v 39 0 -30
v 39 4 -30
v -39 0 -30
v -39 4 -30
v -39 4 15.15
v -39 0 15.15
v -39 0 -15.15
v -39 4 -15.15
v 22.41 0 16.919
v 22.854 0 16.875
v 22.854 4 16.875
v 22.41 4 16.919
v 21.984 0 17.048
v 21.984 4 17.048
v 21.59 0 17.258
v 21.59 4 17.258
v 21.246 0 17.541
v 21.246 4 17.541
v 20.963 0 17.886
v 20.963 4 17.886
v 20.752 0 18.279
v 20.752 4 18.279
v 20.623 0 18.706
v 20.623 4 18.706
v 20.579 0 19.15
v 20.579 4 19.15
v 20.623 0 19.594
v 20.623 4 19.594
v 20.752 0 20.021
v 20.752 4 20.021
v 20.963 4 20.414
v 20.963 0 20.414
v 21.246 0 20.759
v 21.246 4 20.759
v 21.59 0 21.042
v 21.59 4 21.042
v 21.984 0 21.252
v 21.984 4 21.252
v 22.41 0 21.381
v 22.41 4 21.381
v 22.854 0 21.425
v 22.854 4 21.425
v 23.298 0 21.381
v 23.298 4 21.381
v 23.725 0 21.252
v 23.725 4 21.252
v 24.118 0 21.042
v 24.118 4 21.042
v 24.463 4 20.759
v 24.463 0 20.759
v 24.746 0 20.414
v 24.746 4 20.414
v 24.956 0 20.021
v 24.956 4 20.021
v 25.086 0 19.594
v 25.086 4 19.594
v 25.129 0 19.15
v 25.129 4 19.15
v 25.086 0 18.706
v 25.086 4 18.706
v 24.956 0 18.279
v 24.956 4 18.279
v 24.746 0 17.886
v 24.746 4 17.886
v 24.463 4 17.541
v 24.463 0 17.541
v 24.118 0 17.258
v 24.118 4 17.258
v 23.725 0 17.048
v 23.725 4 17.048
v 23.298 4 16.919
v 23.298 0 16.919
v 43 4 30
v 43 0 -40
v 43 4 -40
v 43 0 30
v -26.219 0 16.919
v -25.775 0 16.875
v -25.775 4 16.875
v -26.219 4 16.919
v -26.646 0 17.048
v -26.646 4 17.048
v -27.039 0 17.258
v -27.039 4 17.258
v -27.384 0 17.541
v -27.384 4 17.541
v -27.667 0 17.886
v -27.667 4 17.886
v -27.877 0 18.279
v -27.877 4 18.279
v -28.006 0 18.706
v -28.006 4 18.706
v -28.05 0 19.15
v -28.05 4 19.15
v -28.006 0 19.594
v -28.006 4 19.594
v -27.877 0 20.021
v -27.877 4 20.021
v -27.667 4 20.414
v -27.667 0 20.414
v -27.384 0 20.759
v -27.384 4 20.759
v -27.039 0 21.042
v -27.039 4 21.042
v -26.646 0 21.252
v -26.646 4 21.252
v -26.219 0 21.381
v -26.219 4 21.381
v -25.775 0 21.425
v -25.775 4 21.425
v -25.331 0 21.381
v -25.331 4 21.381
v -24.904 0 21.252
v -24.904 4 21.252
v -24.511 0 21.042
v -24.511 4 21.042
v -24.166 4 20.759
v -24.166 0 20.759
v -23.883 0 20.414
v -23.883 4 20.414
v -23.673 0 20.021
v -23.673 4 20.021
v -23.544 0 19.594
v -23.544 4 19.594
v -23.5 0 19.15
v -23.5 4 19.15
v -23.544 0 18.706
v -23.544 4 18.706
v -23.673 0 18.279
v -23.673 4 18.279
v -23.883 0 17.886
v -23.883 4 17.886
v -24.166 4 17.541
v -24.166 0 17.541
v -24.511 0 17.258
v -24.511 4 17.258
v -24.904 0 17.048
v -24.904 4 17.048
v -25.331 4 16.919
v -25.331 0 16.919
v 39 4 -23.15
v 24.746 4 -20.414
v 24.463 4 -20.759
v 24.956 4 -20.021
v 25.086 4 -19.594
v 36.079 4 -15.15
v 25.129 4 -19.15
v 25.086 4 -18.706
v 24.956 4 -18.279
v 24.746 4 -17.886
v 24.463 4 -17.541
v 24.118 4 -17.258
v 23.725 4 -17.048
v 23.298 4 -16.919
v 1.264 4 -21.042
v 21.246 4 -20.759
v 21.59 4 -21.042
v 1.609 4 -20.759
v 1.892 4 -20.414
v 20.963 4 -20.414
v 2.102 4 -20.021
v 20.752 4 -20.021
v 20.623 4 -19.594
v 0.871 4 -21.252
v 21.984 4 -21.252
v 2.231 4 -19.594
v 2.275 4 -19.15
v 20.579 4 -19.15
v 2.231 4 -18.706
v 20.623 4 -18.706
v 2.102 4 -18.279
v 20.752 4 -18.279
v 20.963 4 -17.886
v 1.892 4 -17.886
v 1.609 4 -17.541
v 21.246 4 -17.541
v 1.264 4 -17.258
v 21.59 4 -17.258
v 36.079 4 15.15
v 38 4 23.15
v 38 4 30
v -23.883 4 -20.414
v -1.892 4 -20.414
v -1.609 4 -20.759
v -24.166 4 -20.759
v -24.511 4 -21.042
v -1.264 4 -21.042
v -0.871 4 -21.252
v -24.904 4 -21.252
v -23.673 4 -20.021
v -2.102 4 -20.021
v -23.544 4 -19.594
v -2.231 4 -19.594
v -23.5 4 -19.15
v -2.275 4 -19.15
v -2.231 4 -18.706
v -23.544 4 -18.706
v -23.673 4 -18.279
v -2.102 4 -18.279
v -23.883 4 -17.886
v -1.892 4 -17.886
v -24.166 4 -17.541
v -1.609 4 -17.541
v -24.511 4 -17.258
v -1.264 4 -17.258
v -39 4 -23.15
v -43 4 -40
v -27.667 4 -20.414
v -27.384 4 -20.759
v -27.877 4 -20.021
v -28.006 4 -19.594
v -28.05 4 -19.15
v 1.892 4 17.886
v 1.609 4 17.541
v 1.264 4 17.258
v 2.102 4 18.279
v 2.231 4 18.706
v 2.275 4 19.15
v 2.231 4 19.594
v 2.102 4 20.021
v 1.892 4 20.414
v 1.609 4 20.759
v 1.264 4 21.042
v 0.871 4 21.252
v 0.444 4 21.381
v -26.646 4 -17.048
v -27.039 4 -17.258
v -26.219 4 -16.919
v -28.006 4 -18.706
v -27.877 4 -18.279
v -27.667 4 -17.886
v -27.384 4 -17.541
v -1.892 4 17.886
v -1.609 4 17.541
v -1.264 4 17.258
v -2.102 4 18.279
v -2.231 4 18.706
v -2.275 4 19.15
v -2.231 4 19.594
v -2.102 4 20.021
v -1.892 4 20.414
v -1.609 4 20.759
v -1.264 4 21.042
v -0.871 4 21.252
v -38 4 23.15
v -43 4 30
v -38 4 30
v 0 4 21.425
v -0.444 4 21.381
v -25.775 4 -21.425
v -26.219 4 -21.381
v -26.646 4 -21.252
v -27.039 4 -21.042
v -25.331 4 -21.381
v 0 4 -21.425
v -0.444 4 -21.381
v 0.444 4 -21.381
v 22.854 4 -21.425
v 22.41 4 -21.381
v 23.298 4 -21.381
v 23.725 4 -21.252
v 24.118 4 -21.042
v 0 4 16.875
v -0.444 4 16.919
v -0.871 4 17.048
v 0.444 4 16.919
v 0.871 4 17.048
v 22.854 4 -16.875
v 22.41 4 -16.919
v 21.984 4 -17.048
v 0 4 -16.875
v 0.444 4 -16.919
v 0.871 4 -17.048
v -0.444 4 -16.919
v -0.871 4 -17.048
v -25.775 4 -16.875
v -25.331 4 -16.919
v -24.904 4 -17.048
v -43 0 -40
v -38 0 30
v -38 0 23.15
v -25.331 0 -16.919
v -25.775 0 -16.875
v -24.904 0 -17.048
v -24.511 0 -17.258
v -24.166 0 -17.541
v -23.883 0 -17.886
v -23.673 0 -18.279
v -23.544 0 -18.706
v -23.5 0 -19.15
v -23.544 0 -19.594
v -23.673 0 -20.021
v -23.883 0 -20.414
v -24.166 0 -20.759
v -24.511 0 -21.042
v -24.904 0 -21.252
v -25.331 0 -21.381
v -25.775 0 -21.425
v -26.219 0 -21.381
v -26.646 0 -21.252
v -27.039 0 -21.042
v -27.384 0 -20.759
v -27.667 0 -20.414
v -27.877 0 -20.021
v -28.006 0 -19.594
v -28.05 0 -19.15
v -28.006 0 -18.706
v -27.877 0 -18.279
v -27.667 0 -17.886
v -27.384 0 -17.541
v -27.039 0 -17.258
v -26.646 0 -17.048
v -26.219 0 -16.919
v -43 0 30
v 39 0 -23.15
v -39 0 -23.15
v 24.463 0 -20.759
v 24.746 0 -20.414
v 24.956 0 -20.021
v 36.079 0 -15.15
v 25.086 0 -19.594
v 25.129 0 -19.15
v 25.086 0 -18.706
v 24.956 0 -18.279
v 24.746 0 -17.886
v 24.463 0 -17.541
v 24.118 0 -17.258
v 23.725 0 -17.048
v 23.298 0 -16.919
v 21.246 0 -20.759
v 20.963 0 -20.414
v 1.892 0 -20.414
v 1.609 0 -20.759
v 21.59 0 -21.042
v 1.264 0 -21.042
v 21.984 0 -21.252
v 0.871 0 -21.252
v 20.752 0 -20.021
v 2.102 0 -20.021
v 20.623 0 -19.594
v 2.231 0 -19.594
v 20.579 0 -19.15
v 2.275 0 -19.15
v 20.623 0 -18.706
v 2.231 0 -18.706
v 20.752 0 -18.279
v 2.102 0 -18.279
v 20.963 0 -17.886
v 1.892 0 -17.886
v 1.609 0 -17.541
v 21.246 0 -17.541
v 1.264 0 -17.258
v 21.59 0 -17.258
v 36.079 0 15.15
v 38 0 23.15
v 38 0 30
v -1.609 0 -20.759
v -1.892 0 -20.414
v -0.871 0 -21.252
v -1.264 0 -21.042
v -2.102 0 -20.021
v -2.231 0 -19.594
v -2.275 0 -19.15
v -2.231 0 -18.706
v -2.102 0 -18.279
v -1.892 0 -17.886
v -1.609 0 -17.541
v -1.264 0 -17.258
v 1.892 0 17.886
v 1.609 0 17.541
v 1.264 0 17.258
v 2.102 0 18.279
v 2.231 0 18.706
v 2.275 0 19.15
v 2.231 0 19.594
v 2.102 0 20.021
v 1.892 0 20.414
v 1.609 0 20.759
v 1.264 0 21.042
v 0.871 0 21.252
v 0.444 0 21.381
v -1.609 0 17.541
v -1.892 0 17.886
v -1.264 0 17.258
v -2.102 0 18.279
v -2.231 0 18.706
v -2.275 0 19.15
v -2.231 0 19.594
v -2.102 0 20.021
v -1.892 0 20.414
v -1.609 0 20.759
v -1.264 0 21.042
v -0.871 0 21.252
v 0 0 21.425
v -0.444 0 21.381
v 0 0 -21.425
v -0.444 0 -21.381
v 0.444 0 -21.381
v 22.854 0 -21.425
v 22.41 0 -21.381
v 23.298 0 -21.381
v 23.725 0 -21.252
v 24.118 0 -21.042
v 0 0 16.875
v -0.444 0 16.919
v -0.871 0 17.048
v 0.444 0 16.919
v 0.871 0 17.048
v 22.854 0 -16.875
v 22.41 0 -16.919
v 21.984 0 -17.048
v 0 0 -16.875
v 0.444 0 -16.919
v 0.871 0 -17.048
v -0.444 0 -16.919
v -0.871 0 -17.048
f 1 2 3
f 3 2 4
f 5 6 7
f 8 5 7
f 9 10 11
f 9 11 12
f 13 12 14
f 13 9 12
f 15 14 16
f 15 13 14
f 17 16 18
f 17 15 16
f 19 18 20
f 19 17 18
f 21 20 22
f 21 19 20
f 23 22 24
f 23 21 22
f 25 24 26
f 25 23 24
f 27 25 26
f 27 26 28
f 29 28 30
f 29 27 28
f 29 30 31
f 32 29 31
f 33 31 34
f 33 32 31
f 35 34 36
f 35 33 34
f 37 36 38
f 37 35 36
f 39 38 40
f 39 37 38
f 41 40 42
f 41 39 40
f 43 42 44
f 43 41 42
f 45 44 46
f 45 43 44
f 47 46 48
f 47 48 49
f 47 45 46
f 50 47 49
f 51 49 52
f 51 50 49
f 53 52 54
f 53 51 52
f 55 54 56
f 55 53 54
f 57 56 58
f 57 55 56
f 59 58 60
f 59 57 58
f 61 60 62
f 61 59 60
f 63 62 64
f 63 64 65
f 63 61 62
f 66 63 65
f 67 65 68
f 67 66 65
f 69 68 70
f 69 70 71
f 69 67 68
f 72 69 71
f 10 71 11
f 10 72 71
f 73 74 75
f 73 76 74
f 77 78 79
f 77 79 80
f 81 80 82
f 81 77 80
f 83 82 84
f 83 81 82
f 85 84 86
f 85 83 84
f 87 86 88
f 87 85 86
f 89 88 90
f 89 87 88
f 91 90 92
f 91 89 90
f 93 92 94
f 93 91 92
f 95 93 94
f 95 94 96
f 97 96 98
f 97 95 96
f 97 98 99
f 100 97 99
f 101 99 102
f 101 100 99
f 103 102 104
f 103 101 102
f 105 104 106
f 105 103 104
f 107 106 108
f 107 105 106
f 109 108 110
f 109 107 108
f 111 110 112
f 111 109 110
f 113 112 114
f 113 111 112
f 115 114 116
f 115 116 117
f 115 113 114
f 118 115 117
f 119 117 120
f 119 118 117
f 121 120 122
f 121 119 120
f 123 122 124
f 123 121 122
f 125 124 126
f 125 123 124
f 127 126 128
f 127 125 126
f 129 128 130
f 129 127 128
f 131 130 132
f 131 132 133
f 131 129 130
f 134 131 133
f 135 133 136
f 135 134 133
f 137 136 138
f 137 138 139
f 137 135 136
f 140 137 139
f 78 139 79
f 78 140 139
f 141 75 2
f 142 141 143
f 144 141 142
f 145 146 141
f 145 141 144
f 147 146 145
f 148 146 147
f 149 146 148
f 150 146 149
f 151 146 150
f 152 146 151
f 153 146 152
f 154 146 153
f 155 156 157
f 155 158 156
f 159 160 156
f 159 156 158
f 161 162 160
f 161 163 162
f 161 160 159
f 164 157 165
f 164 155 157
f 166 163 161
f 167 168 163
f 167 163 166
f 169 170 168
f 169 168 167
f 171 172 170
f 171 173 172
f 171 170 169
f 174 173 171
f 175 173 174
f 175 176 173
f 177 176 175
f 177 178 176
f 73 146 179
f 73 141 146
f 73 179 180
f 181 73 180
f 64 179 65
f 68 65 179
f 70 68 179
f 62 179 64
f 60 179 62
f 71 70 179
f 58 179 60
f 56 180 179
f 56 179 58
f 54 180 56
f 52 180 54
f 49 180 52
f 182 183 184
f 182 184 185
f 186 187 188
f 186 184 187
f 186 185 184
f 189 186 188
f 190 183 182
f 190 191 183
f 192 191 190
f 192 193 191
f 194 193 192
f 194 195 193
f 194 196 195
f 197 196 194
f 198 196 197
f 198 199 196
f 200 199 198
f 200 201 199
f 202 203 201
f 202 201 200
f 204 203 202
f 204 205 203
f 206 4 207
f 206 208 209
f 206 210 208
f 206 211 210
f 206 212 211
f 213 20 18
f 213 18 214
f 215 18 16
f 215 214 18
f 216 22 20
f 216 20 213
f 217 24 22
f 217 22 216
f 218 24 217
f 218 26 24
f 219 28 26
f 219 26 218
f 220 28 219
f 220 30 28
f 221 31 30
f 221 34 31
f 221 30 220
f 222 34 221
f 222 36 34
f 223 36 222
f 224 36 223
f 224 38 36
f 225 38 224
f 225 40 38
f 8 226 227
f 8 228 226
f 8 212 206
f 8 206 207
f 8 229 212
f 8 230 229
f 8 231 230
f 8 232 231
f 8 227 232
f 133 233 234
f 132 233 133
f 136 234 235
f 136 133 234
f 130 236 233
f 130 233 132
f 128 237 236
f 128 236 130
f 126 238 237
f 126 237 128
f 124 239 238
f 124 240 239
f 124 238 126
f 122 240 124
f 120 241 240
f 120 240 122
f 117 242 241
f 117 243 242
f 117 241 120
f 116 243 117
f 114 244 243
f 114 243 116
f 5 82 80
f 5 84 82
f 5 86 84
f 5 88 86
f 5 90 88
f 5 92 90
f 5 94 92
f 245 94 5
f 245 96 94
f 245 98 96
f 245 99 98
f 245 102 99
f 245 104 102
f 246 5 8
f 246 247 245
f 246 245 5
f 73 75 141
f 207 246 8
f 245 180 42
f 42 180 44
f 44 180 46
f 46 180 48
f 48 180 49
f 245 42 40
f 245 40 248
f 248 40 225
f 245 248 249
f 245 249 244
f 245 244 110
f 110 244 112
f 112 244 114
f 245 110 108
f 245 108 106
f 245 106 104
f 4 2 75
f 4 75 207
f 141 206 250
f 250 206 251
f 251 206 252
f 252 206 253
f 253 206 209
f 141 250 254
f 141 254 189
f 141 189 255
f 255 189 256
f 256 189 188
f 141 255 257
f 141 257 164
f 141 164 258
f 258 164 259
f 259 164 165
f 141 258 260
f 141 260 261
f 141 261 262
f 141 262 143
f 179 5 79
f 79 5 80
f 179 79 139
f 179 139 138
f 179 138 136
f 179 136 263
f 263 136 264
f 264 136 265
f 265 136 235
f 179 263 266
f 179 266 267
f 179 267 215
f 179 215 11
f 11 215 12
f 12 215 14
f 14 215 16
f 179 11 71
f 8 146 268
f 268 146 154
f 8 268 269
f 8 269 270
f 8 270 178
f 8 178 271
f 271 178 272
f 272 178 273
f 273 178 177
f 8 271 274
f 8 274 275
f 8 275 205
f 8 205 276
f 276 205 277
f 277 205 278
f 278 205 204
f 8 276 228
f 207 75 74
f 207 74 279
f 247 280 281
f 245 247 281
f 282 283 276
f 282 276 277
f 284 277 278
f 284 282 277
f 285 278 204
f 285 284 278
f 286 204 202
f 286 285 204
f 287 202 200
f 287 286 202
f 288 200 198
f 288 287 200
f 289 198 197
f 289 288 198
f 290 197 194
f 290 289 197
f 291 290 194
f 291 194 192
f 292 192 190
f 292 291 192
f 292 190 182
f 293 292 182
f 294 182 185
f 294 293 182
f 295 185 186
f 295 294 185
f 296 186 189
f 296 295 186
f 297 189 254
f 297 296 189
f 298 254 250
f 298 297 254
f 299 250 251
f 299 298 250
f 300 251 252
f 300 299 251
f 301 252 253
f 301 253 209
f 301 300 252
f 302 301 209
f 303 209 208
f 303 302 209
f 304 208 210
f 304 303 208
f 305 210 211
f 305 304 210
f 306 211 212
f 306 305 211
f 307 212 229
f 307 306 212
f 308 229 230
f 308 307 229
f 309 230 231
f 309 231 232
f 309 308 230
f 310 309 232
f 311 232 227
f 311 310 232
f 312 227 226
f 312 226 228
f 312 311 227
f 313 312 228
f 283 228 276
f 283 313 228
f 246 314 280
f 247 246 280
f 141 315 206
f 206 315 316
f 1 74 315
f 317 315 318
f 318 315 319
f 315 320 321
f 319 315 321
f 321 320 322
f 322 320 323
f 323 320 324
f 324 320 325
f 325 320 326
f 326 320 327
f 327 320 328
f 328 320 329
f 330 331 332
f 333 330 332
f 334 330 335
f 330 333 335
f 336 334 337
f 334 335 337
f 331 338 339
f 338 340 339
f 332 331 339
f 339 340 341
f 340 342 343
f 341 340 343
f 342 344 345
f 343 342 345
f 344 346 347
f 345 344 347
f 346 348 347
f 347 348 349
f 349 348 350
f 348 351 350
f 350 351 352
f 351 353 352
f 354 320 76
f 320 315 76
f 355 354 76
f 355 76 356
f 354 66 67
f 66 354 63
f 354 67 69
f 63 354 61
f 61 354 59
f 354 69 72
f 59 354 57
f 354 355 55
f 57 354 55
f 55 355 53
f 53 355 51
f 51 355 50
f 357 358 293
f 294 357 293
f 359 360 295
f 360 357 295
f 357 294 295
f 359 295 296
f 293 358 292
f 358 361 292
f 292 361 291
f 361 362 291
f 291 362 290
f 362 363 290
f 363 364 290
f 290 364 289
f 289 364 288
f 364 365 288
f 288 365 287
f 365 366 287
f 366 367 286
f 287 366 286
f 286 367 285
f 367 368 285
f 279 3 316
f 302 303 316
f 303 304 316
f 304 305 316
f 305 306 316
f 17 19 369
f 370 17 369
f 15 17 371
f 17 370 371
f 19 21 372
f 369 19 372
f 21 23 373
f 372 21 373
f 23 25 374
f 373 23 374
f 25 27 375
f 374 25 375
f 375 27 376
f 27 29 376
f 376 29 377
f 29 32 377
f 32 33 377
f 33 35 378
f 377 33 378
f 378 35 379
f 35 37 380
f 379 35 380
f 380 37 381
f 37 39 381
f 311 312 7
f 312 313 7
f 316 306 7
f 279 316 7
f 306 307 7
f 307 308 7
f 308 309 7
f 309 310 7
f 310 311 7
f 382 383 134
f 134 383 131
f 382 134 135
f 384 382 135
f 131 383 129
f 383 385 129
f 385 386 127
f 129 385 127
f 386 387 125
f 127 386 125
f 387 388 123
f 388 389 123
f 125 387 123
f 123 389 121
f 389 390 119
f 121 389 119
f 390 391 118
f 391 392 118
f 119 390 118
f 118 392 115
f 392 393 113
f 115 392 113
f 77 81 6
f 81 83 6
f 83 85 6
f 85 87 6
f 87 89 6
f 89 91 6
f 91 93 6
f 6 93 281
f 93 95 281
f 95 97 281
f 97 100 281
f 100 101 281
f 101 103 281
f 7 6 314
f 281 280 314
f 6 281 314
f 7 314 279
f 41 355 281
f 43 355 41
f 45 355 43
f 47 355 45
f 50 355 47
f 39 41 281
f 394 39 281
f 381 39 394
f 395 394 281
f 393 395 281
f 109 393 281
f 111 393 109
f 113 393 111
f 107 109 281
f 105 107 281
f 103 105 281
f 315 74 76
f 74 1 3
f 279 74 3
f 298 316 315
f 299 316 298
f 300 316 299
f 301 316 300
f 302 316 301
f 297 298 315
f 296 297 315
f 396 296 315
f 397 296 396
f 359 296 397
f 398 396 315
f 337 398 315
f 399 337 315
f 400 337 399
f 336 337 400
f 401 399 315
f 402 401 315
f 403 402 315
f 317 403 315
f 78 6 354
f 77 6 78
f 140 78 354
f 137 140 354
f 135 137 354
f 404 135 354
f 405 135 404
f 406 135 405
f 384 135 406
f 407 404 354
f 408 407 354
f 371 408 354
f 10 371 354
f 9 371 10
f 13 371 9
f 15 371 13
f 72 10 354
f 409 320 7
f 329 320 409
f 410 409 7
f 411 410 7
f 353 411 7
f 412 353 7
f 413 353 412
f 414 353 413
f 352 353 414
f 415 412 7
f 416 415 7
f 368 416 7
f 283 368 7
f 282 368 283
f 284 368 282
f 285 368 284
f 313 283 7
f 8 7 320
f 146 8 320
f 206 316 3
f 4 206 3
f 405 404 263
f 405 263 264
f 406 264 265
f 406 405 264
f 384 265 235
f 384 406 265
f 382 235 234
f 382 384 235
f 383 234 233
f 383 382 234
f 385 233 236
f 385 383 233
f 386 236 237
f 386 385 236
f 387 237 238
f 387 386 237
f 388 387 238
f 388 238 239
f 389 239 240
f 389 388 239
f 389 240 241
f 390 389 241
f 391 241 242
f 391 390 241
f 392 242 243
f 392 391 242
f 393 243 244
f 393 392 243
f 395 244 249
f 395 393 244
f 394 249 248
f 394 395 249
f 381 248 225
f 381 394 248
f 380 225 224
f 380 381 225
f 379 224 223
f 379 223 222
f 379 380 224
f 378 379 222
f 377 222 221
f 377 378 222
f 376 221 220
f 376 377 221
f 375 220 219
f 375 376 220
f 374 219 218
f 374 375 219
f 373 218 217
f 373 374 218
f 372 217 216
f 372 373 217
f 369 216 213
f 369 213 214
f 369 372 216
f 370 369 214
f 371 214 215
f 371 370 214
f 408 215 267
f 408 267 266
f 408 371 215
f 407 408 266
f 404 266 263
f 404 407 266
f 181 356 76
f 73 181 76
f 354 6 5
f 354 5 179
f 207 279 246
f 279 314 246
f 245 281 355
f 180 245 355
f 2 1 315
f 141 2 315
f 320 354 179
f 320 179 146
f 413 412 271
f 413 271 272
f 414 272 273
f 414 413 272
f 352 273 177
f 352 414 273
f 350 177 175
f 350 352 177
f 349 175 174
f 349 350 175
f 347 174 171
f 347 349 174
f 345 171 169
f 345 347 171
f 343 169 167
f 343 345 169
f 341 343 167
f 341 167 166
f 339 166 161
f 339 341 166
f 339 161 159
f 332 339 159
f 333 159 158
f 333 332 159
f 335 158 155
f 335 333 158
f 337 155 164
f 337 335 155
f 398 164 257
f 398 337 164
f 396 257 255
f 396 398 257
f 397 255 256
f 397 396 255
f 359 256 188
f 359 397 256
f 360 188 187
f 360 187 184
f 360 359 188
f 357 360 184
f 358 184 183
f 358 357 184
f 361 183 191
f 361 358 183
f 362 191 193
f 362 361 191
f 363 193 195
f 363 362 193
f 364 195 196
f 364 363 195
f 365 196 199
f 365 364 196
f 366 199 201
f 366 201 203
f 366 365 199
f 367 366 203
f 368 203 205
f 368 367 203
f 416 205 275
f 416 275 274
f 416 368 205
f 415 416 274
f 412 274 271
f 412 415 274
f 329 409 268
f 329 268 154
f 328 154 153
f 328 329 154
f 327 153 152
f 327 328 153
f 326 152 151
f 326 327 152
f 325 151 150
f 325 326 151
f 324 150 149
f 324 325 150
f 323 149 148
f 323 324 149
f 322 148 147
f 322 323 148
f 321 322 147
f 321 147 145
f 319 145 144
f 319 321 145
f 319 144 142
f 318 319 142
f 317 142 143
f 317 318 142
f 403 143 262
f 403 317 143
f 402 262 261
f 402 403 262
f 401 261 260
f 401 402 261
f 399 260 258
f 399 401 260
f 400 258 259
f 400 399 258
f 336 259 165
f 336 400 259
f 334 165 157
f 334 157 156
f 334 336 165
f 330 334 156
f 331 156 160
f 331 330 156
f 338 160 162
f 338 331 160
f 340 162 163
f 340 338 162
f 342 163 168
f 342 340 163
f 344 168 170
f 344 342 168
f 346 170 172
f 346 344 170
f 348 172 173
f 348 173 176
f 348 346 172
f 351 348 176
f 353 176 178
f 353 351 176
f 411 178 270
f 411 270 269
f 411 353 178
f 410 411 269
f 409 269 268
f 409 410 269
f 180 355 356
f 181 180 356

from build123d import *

# Parameters (mm, degrees)
SKETCH2_R           = 2.275
SKETCH2_W           = 75.079254151
SKETCH2_H           = 30.3
BOSS_EXTRUDE1_DEPTH = 4
SKETCH3_W           = 86
SKETCH3_H           = 4
BOSS_EXTRUDE2_DEPTH = 10


with BuildPart() as part:
    # Sketch2 → Boss-Extrude1 (new body)
    with BuildSketch(Plane(origin=(0, 0, 0), x_dir=(1, 0, 0), z_dir=(0, 1, 0))):
        Polygon((43, 30), (39, 30), (39, 23.15), (-39, 23.15), (-39, 30), (-43, 30), (-43, -30), (-38, -30), (-38, -23.15), (38, -23.15), (38, -30), (43, -30), align=None)
        with Locations(Location((-25.775, 19.15, 0), (0, 0, 270))):
            Circle(SKETCH2_R, mode=Mode.SUBTRACT)
        with Locations(Location((22.854254151, 19.15, 0), (0, 0, 270))):
            Circle(SKETCH2_R, mode=Mode.SUBTRACT)
        with Locations(Location((0, 19.15, 0), (0, 0, 270))):
            Circle(SKETCH2_R, mode=Mode.SUBTRACT)
        with Locations(Location((22.854254151, -19.15, 0), (0, 0, 90))):
            Circle(SKETCH2_R, mode=Mode.SUBTRACT)
        with Locations(Location((0, -19.15, 0), (0, 0, 90))):
            Circle(SKETCH2_R, mode=Mode.SUBTRACT)
        with Locations(Location((-25.775, -19.15, 0), (0, 0, 90))):
            Circle(SKETCH2_R, mode=Mode.SUBTRACT)
        with Locations((-1.460372924, 0)):
            Rectangle(SKETCH2_W, SKETCH2_H, mode=Mode.SUBTRACT)
    extrude(amount=BOSS_EXTRUDE1_DEPTH)

    # Sketch3 → Boss-Extrude2 (add)
    with BuildSketch(Plane(origin=(0, 0, -30), x_dir=(-1, 0, 0), z_dir=(0, 0, -1))):
        with Locations((0, 2)):
            Rectangle(SKETCH3_W, SKETCH3_H)
    extrude(amount=BOSS_EXTRUDE2_DEPTH)


solid = part.part
